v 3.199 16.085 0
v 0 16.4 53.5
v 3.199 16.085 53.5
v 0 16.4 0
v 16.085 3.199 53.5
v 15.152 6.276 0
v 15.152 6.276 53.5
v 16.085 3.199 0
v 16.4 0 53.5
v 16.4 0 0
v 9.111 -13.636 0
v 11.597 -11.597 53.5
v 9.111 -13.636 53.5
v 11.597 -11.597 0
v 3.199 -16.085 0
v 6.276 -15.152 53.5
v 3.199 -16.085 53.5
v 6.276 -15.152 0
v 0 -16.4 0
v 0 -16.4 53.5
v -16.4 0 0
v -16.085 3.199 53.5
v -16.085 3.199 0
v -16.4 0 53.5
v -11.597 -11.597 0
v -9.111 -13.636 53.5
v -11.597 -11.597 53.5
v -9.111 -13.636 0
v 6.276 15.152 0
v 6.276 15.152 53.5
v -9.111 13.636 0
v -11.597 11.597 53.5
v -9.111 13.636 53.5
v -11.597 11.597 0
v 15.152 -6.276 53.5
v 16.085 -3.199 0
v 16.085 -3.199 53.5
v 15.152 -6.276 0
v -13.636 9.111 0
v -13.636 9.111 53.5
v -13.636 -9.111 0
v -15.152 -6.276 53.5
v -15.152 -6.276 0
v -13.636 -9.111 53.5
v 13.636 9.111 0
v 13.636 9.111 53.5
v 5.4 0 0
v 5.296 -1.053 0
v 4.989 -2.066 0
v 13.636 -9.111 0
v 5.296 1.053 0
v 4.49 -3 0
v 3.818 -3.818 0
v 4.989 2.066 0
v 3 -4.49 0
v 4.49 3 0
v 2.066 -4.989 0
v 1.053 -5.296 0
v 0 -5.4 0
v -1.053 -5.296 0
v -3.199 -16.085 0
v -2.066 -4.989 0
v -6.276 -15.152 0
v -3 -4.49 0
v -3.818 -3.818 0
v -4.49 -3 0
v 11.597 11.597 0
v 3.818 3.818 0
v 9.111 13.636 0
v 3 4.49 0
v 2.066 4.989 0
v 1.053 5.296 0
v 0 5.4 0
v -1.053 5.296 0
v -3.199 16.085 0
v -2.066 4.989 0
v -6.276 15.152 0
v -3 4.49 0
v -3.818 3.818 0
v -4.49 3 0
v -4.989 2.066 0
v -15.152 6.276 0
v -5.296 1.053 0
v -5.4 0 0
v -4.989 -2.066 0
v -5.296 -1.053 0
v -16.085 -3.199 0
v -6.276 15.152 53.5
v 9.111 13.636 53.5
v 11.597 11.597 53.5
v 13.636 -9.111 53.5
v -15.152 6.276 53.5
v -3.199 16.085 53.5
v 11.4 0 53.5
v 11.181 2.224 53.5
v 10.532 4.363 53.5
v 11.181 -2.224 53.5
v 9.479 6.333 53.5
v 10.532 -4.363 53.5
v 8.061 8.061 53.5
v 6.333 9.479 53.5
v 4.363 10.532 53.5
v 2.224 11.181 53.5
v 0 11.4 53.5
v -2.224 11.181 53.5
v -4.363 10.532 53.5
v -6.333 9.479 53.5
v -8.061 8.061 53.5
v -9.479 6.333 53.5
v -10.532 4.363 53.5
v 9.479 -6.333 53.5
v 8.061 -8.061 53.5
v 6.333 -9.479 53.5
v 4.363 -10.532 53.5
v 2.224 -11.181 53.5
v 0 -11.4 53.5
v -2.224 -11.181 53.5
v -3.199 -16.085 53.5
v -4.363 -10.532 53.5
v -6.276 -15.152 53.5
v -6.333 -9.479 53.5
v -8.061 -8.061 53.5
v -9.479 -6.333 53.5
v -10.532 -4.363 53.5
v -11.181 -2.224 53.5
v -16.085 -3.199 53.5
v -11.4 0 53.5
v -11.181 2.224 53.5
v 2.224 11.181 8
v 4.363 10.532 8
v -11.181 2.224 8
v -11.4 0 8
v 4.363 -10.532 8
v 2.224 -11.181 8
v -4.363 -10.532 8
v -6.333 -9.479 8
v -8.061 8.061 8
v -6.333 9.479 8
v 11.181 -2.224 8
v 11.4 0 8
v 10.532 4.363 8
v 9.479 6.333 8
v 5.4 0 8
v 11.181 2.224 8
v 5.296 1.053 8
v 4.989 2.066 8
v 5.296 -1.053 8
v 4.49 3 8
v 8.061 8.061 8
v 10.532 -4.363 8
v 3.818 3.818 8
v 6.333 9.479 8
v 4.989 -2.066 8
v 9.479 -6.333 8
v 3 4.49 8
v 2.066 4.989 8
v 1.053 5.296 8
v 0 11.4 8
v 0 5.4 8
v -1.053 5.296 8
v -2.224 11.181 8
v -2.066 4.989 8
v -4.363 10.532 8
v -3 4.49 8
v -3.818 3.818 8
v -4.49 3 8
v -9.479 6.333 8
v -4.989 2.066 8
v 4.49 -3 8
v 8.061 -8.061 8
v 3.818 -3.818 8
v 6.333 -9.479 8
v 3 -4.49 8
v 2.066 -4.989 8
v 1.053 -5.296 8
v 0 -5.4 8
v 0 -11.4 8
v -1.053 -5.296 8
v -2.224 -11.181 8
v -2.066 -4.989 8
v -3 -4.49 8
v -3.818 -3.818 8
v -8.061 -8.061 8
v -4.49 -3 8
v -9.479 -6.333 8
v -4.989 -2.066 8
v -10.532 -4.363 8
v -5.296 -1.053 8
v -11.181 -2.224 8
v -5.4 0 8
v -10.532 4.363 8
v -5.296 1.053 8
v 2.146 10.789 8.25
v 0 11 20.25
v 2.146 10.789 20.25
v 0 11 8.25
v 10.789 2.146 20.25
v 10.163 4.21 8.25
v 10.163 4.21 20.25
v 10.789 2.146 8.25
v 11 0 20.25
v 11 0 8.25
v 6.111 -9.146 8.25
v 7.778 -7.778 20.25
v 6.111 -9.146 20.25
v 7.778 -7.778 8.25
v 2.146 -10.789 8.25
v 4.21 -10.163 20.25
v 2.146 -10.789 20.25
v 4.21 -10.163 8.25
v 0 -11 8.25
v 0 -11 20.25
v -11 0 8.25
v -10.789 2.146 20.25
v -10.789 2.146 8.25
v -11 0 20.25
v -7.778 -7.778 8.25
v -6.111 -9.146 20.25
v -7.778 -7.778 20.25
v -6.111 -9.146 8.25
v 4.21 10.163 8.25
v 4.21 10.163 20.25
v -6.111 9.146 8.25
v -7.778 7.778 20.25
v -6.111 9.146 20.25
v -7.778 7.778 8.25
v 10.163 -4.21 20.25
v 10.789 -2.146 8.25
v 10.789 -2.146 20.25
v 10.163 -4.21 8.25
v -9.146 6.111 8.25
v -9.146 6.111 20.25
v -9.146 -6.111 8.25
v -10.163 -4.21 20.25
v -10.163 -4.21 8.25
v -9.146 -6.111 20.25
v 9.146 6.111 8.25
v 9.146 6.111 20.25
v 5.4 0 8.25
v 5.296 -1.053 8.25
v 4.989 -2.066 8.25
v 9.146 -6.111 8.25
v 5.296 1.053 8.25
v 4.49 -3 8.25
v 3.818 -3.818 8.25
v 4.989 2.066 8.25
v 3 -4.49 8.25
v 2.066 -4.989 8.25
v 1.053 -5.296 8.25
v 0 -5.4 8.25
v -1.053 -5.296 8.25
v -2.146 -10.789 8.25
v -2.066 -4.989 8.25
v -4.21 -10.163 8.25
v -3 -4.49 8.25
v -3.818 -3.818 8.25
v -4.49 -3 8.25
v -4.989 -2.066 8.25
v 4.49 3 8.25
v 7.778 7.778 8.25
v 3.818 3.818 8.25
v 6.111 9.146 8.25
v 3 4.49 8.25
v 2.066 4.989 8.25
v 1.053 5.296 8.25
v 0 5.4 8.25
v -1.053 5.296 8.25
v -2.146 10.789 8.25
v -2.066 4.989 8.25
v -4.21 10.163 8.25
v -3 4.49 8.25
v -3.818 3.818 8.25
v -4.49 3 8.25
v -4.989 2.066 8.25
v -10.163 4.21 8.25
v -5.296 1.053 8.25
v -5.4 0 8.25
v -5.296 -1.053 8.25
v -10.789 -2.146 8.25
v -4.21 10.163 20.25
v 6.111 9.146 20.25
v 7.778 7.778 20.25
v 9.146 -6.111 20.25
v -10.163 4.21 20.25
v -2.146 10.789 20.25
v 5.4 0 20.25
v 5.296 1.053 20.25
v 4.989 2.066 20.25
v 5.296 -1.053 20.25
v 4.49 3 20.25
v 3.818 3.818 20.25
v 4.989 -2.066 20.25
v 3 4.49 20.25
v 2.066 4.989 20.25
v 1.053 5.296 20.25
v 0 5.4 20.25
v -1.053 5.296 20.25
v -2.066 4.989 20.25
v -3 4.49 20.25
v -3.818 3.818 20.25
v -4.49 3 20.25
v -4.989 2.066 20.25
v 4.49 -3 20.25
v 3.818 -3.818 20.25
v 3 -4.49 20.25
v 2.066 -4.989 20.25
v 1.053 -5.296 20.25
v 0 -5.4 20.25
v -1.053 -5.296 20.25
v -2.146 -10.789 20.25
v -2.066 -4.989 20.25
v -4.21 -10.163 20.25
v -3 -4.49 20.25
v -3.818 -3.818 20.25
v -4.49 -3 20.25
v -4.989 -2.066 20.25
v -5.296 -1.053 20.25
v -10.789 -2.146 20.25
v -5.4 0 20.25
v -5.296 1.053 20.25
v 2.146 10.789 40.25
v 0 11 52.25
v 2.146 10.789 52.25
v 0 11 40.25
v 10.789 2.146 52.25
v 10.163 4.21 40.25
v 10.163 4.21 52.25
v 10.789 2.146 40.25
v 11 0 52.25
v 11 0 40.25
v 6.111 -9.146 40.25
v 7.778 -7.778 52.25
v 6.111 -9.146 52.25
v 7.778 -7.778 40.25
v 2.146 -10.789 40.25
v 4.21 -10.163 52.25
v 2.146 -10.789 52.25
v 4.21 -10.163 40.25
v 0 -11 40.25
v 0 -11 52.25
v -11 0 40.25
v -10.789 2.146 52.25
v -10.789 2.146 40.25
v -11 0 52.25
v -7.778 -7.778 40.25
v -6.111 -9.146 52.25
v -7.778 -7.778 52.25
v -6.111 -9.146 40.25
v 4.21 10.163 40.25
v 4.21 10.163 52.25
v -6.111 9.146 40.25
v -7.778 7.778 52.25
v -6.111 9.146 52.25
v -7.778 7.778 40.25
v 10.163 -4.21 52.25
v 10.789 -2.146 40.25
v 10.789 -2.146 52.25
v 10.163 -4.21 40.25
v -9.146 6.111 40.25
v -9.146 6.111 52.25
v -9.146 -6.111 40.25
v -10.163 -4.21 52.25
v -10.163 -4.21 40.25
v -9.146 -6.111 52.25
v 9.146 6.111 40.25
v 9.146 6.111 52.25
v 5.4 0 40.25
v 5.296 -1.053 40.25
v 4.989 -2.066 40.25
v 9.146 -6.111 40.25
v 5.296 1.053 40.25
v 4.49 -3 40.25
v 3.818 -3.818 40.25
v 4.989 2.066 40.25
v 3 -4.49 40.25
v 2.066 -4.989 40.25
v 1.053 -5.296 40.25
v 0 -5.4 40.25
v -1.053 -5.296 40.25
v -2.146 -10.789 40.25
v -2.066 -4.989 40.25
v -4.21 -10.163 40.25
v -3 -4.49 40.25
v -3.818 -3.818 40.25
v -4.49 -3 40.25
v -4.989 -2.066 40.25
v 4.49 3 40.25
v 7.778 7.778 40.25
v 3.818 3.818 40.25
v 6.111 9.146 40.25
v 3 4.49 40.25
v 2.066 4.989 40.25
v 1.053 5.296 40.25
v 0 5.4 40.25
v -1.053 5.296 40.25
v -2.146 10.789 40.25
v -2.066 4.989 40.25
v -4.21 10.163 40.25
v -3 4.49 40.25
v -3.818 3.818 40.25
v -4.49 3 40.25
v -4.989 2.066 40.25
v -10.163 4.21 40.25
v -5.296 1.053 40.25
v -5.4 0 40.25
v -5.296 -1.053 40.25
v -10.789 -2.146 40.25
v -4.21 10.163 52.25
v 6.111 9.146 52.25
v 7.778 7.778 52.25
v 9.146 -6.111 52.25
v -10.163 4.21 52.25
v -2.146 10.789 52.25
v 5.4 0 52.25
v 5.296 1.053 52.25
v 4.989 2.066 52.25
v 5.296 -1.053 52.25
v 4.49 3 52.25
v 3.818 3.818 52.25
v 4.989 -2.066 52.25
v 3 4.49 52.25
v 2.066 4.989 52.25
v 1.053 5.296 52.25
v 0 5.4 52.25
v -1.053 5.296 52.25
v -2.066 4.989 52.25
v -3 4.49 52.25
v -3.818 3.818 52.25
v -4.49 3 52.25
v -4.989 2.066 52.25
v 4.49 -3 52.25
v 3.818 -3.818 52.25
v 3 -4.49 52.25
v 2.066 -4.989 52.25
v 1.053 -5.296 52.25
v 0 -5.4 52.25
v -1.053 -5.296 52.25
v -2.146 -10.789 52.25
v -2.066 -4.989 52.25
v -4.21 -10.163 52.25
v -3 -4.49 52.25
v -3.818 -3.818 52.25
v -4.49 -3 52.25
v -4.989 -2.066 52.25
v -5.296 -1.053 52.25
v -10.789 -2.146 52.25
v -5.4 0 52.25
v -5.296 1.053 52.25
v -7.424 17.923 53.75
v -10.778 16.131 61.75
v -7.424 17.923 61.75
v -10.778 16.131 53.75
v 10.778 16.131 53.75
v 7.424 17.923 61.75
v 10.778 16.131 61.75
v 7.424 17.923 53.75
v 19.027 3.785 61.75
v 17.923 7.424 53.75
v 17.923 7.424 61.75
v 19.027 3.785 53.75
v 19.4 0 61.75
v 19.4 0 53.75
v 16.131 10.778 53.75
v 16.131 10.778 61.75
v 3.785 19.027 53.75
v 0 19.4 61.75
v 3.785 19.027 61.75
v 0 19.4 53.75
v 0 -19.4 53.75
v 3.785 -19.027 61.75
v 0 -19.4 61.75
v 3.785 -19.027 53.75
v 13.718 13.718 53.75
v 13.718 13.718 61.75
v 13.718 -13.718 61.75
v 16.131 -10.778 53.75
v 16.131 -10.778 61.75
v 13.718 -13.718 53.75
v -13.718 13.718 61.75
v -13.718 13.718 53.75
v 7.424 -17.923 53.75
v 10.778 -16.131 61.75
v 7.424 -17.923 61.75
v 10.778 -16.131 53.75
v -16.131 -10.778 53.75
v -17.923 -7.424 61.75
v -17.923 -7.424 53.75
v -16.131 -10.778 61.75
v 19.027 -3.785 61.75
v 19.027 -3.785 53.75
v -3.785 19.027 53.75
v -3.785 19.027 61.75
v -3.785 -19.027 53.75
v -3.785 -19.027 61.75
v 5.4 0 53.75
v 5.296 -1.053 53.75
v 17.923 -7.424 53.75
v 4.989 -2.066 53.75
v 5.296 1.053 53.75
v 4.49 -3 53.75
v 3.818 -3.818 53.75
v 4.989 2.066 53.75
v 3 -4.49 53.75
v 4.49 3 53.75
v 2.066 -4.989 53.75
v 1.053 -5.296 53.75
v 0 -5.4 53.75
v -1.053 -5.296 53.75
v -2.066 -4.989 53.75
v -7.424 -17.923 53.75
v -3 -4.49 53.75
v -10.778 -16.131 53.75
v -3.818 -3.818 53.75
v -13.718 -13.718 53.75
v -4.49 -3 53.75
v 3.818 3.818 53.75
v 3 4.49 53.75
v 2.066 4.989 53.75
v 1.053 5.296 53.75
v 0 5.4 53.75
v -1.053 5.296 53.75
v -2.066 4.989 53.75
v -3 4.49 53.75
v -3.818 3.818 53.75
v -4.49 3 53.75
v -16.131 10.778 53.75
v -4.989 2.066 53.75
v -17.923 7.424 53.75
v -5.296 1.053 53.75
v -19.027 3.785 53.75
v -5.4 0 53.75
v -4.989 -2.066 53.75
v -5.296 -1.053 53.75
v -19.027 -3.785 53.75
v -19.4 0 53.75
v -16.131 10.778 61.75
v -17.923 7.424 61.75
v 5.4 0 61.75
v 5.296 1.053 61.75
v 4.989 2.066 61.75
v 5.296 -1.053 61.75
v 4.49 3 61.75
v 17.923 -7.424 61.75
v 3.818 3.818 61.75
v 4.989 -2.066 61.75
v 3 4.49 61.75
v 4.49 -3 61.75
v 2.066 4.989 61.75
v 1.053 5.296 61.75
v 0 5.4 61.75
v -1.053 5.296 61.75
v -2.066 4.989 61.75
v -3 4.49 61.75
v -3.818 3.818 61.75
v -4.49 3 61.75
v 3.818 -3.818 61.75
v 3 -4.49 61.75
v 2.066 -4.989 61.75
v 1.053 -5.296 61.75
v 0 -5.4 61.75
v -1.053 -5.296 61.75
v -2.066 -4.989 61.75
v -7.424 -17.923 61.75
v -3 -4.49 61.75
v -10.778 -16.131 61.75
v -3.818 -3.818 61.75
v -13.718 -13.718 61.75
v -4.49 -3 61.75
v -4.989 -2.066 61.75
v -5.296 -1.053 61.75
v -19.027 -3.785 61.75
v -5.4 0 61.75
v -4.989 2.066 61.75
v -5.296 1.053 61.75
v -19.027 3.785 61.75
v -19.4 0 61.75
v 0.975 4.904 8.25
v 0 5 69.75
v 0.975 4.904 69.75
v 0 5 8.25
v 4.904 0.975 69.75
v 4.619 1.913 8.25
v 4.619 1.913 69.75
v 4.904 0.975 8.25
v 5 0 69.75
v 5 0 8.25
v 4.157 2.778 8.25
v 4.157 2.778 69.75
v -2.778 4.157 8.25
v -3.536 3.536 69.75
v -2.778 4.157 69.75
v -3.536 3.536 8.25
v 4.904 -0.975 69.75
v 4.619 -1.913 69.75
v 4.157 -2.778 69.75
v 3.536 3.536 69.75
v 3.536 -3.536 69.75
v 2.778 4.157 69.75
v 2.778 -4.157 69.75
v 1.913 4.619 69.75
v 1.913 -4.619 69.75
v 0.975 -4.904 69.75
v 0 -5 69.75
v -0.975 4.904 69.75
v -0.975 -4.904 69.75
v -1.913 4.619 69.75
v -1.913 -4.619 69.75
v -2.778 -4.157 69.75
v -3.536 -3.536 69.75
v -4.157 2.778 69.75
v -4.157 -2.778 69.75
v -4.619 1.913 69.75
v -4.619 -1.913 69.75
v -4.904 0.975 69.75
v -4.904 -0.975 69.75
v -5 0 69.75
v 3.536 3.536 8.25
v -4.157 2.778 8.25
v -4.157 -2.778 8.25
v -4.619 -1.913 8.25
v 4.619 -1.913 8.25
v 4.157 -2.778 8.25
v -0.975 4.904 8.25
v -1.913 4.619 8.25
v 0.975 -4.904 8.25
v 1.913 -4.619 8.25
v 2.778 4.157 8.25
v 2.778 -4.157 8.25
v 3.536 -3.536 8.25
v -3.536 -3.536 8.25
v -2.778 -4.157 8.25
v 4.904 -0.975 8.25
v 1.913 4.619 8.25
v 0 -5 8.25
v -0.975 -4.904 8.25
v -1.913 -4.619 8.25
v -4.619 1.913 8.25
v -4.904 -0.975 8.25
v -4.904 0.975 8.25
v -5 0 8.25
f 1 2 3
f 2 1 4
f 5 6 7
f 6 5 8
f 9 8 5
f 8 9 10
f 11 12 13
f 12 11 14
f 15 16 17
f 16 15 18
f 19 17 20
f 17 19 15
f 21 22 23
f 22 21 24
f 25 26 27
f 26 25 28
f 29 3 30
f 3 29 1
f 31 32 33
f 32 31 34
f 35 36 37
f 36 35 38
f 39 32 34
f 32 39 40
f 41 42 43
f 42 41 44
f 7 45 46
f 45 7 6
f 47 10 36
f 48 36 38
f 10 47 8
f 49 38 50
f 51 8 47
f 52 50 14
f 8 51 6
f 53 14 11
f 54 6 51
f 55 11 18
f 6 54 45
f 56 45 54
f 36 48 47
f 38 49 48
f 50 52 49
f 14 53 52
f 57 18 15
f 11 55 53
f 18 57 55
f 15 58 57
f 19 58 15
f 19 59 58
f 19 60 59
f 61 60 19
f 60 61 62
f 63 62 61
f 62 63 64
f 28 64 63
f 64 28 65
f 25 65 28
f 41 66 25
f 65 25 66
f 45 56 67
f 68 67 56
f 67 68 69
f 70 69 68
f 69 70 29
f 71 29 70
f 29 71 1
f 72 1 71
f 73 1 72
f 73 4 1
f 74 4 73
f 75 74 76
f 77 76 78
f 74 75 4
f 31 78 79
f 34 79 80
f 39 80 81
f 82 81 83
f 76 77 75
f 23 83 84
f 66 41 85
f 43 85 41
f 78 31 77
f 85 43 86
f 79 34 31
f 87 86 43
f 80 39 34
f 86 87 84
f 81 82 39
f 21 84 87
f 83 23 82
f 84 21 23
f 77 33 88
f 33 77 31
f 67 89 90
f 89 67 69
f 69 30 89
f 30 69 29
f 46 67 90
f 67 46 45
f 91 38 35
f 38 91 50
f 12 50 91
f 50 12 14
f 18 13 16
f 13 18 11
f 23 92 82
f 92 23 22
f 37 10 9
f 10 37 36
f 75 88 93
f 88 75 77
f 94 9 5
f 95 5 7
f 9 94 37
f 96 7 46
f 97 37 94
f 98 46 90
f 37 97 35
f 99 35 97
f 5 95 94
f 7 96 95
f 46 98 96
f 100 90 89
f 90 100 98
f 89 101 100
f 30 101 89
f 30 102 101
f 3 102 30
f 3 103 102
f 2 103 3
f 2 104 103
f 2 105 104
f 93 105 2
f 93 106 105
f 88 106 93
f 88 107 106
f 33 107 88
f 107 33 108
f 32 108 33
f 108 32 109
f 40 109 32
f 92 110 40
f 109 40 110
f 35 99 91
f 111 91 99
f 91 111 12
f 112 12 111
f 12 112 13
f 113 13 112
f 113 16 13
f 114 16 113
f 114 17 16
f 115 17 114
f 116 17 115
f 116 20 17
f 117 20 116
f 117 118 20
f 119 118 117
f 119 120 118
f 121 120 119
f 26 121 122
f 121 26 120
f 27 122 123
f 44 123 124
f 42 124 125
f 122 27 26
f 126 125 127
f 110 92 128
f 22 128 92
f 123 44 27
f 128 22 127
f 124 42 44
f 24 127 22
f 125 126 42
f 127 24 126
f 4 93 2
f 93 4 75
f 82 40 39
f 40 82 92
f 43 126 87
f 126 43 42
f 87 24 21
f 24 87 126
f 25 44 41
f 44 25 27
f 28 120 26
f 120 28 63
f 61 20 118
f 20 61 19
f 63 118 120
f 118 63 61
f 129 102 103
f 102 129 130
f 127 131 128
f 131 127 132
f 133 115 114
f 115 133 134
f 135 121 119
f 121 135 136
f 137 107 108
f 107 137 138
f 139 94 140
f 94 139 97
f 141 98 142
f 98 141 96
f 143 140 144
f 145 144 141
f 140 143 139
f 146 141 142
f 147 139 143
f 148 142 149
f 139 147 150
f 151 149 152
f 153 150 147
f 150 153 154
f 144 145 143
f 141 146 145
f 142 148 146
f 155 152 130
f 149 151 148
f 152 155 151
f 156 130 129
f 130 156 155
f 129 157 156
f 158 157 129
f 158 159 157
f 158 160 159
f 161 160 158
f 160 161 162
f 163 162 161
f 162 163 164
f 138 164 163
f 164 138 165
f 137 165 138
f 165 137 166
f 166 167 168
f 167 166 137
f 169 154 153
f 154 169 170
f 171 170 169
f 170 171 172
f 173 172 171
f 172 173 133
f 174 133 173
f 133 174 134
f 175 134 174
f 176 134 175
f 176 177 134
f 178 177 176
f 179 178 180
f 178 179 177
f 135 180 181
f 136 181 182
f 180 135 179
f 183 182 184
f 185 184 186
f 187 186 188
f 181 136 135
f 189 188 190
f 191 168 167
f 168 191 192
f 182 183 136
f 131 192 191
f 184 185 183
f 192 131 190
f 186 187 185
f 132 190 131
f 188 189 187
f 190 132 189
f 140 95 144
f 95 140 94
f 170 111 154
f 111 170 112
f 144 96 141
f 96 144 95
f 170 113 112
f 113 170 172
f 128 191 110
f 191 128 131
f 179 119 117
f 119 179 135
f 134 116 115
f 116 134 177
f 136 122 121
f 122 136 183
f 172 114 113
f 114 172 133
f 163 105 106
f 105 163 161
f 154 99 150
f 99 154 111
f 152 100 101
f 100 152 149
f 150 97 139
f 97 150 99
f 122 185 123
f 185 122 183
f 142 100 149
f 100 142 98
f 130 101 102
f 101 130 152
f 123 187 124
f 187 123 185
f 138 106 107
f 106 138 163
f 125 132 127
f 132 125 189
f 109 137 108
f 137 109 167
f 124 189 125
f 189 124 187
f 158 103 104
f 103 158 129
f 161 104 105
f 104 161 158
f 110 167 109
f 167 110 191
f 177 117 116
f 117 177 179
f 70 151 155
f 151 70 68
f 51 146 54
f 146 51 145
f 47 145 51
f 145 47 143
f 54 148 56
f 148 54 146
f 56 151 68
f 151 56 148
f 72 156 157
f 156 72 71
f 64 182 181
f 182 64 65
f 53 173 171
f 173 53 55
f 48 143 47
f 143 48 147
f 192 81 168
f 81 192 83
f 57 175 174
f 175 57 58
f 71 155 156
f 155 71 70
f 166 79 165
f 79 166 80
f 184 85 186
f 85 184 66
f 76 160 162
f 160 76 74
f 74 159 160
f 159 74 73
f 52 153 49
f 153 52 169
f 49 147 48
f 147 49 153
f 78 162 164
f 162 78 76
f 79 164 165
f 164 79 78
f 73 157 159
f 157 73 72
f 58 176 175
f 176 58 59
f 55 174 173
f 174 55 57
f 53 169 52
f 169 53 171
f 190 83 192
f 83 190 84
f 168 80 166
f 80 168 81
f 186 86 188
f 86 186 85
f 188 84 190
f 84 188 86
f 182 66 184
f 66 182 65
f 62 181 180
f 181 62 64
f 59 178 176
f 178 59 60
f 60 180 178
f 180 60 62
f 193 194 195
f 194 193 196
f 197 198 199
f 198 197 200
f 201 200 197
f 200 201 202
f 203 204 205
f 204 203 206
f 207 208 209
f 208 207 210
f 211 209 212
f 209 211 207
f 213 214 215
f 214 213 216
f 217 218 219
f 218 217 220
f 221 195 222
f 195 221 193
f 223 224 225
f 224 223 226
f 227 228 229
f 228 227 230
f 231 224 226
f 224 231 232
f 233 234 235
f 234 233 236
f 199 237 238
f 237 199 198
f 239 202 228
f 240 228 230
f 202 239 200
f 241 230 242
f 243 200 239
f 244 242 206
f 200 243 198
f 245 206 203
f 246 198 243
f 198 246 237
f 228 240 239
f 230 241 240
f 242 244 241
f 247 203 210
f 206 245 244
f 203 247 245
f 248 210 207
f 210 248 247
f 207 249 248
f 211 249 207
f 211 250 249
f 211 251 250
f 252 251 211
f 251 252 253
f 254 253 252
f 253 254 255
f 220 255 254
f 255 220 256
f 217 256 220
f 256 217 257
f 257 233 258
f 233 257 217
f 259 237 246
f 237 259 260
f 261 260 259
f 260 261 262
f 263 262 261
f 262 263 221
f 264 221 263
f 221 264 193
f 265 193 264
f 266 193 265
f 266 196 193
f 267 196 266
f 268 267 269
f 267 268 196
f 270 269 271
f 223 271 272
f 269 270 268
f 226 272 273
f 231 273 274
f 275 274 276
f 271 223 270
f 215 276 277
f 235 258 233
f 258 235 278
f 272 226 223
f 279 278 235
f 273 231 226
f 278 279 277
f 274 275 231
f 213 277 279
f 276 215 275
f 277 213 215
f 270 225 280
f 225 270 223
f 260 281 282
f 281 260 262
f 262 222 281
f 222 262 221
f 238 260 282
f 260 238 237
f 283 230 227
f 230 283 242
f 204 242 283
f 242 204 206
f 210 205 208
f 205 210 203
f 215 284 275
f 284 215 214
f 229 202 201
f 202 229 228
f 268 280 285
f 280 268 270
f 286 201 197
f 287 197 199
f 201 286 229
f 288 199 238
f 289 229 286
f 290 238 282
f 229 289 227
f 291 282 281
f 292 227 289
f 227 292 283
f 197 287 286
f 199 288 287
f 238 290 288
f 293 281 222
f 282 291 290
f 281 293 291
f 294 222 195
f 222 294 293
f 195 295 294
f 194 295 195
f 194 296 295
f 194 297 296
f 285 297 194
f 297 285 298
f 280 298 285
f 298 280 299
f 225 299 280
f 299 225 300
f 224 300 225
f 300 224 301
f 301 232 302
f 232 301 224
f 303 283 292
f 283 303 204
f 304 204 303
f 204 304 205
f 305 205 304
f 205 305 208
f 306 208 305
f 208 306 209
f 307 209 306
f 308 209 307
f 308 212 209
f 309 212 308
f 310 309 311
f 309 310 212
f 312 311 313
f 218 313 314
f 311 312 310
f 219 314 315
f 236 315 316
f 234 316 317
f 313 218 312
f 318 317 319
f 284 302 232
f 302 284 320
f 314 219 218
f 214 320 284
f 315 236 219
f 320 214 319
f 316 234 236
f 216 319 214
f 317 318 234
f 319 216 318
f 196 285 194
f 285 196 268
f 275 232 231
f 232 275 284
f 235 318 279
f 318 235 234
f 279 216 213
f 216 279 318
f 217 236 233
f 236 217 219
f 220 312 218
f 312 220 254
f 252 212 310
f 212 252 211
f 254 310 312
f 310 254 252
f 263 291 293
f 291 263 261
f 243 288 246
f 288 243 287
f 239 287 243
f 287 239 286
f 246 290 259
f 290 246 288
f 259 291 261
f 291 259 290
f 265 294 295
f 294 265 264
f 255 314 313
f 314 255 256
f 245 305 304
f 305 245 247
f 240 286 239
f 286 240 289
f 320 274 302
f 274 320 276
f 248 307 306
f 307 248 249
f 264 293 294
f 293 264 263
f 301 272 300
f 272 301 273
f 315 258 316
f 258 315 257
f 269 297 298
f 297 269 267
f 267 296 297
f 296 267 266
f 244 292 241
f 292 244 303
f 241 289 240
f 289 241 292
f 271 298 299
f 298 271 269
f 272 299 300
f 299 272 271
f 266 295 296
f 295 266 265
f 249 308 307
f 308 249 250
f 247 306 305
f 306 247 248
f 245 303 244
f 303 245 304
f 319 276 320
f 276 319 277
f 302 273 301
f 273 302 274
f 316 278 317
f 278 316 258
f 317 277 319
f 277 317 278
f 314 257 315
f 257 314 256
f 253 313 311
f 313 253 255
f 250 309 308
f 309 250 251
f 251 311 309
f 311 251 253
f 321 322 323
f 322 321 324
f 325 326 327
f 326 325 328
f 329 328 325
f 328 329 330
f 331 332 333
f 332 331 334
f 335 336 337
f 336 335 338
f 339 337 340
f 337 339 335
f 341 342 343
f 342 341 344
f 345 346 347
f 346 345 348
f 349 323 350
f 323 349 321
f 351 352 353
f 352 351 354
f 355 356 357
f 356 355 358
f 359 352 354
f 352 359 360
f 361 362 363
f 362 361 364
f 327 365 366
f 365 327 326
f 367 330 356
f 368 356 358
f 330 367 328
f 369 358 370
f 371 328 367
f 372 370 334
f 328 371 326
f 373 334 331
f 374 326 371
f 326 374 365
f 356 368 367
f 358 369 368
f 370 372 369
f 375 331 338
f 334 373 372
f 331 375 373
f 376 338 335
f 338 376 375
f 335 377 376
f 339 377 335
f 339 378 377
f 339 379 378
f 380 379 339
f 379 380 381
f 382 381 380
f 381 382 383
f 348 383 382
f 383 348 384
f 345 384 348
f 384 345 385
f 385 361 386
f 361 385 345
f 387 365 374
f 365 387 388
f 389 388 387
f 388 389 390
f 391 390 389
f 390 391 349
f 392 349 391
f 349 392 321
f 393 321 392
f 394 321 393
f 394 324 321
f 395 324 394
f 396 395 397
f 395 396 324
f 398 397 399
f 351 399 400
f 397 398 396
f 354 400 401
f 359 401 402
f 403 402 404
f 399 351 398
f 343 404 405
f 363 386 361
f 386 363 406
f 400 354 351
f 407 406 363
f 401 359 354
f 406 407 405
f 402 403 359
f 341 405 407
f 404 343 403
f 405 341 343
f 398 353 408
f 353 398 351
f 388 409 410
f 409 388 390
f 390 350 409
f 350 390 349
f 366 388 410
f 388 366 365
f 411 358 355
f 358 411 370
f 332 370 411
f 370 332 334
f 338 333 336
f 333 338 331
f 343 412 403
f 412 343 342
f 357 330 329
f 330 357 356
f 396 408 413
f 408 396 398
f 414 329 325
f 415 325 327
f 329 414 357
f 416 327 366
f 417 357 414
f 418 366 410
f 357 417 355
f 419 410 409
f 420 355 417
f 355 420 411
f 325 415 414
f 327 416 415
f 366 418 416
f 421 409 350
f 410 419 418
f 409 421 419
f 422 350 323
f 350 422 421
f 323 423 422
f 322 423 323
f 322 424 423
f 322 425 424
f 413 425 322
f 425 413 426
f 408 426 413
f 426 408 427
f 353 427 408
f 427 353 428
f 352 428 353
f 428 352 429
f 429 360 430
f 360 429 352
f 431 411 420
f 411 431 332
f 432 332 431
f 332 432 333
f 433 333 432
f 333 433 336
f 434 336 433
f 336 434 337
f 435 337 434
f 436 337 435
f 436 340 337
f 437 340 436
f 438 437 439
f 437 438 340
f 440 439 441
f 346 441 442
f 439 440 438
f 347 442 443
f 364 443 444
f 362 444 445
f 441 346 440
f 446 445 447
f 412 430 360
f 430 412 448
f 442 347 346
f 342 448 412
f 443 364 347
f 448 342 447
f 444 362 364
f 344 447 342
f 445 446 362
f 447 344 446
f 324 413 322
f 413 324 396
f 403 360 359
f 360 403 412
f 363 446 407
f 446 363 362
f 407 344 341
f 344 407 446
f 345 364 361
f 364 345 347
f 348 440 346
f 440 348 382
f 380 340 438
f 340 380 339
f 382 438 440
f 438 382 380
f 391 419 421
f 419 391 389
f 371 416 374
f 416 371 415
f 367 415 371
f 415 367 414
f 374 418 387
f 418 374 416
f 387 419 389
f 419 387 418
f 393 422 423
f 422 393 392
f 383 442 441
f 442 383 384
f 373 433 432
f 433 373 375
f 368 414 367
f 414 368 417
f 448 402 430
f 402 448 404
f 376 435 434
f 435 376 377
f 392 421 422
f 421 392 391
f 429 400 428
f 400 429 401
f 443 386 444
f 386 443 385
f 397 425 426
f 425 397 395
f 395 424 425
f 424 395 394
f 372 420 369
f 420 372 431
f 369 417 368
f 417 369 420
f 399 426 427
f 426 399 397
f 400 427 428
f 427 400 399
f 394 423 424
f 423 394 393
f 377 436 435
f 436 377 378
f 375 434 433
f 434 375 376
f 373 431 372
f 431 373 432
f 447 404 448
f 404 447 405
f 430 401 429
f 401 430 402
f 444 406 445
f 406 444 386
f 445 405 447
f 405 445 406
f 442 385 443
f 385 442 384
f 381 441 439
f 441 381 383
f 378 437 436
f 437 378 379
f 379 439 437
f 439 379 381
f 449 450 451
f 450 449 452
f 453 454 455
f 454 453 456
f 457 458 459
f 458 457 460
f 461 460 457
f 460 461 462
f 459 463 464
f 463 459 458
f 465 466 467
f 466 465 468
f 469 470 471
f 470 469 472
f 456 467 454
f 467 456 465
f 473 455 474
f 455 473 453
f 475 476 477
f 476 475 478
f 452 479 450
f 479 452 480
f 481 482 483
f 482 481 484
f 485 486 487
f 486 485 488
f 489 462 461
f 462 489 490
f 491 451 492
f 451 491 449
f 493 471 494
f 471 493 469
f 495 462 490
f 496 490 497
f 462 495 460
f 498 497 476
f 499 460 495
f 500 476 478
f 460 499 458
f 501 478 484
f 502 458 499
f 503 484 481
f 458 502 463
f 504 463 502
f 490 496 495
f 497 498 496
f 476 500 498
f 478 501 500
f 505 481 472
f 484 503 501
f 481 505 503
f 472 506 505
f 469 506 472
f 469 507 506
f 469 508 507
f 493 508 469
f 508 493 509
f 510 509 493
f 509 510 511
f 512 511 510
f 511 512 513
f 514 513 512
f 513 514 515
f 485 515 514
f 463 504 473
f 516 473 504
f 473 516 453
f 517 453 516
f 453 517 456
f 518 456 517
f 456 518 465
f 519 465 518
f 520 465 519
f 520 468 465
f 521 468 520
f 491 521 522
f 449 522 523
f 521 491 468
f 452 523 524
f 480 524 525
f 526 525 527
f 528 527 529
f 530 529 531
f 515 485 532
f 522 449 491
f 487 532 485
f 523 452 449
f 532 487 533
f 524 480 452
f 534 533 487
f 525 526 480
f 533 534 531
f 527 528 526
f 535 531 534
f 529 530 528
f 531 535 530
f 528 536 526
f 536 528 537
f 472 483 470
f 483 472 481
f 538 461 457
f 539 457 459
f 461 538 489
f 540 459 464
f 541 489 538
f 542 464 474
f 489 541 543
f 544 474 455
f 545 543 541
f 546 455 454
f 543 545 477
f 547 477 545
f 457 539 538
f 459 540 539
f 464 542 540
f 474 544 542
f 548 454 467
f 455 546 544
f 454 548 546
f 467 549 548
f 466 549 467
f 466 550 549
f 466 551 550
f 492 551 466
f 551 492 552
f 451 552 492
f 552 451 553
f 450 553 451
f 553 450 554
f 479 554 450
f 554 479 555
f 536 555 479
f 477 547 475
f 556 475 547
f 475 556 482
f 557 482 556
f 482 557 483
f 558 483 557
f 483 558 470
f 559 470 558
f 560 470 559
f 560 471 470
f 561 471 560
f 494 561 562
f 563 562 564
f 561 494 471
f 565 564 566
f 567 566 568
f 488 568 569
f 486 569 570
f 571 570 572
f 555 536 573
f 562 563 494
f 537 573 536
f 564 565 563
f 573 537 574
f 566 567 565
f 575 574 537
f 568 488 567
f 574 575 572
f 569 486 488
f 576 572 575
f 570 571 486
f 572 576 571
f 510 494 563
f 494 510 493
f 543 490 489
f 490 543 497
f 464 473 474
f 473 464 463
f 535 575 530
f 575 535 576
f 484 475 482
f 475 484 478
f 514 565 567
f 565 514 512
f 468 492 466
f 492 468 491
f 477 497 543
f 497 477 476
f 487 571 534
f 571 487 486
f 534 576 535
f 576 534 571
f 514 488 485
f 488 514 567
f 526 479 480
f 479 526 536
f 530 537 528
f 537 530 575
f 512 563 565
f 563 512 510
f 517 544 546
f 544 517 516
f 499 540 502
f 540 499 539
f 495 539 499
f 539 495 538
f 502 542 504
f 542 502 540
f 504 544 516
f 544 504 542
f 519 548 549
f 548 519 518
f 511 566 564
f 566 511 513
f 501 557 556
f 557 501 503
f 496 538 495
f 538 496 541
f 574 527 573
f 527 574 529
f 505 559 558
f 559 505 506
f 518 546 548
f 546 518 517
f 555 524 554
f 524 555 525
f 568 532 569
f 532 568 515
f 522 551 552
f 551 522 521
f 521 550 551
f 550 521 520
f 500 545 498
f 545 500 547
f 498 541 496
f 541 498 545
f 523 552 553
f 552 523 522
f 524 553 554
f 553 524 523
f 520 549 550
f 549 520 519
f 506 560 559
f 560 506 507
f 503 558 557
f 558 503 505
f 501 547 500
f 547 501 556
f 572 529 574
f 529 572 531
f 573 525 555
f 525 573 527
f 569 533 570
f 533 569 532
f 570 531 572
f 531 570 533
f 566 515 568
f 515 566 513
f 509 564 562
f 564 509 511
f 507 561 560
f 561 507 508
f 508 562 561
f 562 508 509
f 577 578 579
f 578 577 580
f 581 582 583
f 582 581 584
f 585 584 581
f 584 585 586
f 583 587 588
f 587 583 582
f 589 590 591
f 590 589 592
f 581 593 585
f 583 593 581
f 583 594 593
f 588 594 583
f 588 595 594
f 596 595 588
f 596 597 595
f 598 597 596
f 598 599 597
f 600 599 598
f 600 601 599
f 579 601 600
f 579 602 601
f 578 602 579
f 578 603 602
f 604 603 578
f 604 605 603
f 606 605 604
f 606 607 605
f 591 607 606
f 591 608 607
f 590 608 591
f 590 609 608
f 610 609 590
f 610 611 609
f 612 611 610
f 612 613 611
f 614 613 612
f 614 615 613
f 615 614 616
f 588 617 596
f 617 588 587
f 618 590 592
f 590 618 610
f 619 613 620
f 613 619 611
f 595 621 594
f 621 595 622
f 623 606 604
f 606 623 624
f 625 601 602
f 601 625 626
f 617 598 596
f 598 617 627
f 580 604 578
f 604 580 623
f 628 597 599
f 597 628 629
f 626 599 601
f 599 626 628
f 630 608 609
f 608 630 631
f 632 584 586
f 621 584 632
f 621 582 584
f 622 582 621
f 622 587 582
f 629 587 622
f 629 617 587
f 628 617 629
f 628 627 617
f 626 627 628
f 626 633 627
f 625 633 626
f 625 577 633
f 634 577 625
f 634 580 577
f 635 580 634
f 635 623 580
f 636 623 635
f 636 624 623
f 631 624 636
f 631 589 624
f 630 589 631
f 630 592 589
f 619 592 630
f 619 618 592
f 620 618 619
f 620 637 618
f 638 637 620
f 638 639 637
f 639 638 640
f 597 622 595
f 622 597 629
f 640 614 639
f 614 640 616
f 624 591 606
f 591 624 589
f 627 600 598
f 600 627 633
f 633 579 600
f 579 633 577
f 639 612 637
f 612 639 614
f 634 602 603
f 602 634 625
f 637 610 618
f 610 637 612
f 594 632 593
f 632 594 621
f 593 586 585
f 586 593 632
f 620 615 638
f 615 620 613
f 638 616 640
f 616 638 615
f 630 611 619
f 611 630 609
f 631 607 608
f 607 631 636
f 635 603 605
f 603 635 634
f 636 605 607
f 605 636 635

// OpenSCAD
$fn = 32;

// ------------------------------------------------------------------------
// Shaft station: cup d32.8 x 53.5 mm, shaft d10
// Every part is its own module, assembly() places every instance.
// ------------------------------------------------------------------------

// --- part 1 ---
module housing_cup() {
  difference() {
    cylinder(h = 53.5, d = 32.8);
    translate([0, 0, 8]) cylinder(h = 46.5, d = 22.8);
    translate([0, 0, -1]) cylinder(h = 10, d = 10.8);
  }
}

// --- part 2 ---
module bearing_lower() {
  difference() {
      translate([0, 0, 0]) cylinder(h = 12, d = 22);
      translate([0, 0, -1]) cylinder(h = 14, d = 10.8);
    }
}

// --- part 3 ---
module bearing_upper() {
  difference() {
      translate([0, 0, 0]) cylinder(h = 12, d = 22);
      translate([0, 0, -1]) cylinder(h = 14, d = 10.8);
    }
}

// --- part 4 ---
module station_shaft() {
  translate([0, 0, -30.75]) cylinder(h = 61.5, d = 10);
}

// --- part 5 ---
module station_cover() {
  difference() {
    cylinder(h = 8, d = 38.8);
    translate([0, 0, -1]) cylinder(h = 10, d = 10.8);
  }
}

// --- assembly ---
module assembly() {
  color([0.80, 0.24, 0.20]) translate([0, 0, 0]) rotate([0, 0, 0]) housing_cup();
  color([0.20, 0.45, 0.75]) translate([0, 0, 8.25]) rotate([0, 0, 0]) bearing_lower();
  color([0.25, 0.62, 0.32]) translate([0, 0, 40.25]) rotate([0, 0, 0]) bearing_upper();
  color([0.92, 0.70, 0.18]) translate([0, 0, 39]) rotate([0, 0, 0]) station_shaft();
  color([0.58, 0.35, 0.70]) translate([0, 0, 53.75]) rotate([0, 0, 0]) station_cover();
}

assembly();
